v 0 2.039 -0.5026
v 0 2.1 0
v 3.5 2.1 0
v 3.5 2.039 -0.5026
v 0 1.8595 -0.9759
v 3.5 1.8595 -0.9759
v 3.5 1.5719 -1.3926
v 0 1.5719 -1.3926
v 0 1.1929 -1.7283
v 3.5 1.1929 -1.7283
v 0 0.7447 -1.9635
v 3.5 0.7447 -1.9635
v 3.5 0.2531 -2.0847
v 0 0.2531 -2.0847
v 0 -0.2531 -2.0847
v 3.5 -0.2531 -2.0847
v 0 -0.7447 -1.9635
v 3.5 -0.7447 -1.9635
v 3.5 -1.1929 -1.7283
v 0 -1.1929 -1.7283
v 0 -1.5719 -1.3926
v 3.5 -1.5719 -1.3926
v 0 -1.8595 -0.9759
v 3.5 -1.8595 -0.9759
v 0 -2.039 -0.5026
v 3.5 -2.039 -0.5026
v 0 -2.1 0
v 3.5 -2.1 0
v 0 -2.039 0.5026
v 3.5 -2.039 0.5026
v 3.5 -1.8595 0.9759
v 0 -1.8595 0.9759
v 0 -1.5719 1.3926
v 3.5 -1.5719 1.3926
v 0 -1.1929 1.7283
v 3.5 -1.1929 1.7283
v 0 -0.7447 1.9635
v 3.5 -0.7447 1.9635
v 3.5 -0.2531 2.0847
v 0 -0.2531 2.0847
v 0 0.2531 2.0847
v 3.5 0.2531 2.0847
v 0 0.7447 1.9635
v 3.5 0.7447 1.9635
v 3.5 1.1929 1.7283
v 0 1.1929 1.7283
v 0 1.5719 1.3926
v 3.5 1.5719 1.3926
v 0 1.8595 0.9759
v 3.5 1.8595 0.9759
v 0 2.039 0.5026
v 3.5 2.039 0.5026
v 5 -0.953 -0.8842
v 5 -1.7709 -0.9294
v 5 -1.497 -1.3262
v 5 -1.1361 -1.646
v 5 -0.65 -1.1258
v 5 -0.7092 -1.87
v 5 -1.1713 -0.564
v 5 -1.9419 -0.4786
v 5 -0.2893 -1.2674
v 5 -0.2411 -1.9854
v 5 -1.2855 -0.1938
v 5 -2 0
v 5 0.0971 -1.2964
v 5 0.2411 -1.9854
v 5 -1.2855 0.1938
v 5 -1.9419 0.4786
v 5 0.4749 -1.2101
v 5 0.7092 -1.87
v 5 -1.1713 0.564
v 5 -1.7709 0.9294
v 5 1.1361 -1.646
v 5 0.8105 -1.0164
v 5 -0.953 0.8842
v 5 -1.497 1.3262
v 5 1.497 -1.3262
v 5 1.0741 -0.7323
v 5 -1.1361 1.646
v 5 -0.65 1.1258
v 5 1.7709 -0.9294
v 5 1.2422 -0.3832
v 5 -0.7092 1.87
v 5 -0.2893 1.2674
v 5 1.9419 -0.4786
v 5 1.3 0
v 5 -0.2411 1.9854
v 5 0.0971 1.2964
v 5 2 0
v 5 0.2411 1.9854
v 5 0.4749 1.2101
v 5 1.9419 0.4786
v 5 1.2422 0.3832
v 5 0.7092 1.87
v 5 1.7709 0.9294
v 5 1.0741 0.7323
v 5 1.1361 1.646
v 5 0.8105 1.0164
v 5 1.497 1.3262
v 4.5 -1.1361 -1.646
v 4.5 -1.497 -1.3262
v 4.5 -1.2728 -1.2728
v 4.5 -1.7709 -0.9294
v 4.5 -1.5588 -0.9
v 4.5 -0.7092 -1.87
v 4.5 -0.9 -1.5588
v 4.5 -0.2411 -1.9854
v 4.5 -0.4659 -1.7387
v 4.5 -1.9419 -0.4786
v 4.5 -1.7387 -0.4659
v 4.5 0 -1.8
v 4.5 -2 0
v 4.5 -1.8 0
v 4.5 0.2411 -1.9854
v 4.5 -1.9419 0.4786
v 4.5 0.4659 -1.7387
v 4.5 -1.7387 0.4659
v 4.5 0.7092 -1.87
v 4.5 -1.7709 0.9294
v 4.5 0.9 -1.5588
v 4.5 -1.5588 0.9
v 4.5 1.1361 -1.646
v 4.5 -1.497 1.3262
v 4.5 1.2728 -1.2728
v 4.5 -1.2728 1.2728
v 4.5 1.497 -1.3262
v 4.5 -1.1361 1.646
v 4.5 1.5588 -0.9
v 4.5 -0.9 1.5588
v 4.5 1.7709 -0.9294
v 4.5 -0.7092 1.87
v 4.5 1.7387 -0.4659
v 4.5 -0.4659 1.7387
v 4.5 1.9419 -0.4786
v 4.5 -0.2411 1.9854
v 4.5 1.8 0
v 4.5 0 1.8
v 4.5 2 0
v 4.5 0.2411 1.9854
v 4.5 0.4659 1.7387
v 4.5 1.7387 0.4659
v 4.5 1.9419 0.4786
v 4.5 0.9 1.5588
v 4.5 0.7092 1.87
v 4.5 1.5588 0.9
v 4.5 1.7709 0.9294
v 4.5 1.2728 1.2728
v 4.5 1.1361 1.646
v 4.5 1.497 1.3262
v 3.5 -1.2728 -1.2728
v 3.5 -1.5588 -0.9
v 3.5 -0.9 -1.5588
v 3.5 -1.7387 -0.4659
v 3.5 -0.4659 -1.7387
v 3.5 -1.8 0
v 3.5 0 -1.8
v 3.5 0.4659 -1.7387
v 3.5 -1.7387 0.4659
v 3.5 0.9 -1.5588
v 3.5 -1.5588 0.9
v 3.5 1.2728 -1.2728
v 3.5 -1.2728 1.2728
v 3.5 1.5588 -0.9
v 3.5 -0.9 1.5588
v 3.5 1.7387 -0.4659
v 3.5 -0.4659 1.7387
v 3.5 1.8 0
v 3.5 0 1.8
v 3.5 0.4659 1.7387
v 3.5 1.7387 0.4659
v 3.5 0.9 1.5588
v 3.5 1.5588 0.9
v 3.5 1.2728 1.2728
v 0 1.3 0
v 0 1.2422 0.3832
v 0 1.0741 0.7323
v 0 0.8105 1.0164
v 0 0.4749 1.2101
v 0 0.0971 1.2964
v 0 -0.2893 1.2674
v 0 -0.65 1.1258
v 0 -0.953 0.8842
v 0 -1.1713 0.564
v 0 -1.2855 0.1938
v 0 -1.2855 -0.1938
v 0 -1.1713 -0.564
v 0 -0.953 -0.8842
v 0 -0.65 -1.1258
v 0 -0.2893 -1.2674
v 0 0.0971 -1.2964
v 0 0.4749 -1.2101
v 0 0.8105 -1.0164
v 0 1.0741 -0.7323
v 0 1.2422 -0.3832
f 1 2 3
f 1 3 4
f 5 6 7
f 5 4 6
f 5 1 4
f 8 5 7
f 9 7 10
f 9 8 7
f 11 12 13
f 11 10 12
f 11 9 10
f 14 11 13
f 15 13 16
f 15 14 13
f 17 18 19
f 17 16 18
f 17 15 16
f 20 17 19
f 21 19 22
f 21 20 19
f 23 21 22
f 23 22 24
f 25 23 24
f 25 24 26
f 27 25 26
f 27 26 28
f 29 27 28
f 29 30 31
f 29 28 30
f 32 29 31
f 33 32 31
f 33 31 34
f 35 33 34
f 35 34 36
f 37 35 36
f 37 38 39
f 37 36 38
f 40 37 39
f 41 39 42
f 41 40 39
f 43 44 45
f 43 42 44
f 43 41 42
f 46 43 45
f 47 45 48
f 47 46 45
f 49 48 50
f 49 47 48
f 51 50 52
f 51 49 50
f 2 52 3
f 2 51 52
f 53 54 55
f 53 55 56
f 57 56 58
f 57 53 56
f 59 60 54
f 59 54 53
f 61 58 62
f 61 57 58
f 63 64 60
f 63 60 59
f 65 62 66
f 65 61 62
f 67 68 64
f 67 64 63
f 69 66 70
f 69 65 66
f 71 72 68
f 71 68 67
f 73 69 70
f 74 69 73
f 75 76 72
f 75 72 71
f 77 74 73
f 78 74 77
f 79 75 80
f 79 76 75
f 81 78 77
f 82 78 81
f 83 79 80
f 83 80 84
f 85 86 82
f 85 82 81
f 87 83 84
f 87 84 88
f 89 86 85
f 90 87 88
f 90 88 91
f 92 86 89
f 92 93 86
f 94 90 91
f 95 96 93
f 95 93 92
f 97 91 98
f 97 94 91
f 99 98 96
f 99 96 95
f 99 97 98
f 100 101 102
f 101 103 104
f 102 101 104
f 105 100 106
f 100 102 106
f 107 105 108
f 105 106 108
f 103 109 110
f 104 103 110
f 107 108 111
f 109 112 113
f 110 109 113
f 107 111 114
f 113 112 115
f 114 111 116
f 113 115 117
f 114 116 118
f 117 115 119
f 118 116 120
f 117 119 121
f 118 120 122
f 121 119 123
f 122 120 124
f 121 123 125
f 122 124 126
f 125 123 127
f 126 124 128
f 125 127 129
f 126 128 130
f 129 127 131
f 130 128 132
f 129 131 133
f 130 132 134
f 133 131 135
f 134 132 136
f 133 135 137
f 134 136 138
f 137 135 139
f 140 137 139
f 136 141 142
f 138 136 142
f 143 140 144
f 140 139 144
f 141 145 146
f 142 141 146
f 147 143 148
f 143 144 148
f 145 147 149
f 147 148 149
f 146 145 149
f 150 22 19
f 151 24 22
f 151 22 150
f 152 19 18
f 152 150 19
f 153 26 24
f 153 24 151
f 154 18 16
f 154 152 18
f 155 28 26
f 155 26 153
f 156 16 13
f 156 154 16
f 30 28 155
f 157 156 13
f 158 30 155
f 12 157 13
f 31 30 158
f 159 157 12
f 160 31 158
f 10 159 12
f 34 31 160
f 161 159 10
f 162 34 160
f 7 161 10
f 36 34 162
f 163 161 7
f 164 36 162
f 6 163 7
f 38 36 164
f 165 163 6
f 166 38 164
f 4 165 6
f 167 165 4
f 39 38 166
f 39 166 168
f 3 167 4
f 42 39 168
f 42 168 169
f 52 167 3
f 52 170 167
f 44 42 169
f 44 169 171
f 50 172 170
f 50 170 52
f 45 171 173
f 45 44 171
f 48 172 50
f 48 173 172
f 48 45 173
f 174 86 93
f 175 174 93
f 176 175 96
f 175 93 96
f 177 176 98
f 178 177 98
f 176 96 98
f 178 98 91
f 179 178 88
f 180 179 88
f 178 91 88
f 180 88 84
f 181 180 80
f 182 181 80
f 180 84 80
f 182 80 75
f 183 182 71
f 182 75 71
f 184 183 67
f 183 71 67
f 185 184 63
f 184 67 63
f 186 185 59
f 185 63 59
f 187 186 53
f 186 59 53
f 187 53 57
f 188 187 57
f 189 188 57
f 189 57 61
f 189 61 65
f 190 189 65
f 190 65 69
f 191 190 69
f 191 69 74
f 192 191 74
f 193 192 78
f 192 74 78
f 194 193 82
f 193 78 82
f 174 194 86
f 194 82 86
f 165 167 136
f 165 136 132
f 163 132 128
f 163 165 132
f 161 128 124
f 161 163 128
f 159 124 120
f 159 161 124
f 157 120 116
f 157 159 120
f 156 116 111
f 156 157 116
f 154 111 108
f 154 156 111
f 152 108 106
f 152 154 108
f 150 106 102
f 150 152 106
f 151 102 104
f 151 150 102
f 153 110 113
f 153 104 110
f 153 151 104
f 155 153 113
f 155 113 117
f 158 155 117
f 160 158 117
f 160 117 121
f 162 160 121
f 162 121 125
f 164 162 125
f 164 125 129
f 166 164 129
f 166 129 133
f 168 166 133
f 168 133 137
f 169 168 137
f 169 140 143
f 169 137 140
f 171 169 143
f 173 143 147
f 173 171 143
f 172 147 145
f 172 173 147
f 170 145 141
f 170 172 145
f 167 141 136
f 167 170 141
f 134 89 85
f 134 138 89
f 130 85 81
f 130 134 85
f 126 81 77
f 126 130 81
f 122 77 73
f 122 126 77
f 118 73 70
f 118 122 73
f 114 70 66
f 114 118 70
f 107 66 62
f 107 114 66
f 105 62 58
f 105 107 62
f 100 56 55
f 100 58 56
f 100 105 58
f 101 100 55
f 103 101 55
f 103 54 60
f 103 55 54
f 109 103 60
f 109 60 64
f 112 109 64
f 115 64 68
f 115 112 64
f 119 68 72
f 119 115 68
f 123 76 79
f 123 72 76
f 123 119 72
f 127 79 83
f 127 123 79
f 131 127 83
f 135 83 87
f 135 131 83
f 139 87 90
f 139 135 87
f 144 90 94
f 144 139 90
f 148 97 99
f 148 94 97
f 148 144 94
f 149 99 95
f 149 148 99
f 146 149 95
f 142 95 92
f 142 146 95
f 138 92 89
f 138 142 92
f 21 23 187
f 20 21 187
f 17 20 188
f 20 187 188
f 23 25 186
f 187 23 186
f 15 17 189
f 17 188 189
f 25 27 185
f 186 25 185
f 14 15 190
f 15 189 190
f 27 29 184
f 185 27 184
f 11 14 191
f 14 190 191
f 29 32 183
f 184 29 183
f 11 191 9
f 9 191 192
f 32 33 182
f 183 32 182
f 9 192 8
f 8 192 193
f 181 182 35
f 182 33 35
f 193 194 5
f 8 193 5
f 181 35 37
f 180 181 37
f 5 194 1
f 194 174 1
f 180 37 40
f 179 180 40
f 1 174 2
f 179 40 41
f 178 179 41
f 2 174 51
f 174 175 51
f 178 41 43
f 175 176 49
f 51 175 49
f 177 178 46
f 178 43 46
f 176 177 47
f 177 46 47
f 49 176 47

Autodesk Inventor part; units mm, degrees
ref_plane "YZ Plane" through (0, 0, 0) normal (1, 0, 0) x (0, 1, 0)
ref_plane "XZ Plane" through (0, 0, 0) normal (0, 1, 0) x (-1, 0, 0)
ref_plane "XY Plane" through (0, 0, 0) normal (0, 0, 1) x (1, 0, 0)
sketch "Эскиз1" plane through (0, 0, 0) normal (0, 0, 1) x (1, 0, 0)
  line L0 (0, 1.3) -> (5, 1.3)
  line L1 (5, 1.3) -> (5, 2)
  line L2 (5, 2) -> (4.5, 2)
  line L3 (4.5, 2) -> (4.5, 1.8)
  line L4 (4.5, 1.8) -> (3.5, 1.8)
  line L5 (3.5, 1.8) -> (3.5, 2.1)
  line L6 (3.5, 2.1) -> (0, 2.1)
  line L7 (0, 2.1) -> (0, 1.3)
  line L8 (-1, 0) -> (6, 0) construction
  line L9 (0, -0.42) -> (0, 2.52) construction
  point P0 (0, 0)
  dimension "d0" = 1.3
  dimension "d1" = 2.1
  dimension "d2" = 2
  dimension "d3" = 0.5
  dimension "d4" = 5
  dimension "d5" = 0.5
  dimension "d6" = 3.5
revolve "Вращение1" add sketch "Эскиз1" angle 360 about axis through (-10, 0, 0) along (1, 0, 0)
properties part number "Резьбовая втулка"
